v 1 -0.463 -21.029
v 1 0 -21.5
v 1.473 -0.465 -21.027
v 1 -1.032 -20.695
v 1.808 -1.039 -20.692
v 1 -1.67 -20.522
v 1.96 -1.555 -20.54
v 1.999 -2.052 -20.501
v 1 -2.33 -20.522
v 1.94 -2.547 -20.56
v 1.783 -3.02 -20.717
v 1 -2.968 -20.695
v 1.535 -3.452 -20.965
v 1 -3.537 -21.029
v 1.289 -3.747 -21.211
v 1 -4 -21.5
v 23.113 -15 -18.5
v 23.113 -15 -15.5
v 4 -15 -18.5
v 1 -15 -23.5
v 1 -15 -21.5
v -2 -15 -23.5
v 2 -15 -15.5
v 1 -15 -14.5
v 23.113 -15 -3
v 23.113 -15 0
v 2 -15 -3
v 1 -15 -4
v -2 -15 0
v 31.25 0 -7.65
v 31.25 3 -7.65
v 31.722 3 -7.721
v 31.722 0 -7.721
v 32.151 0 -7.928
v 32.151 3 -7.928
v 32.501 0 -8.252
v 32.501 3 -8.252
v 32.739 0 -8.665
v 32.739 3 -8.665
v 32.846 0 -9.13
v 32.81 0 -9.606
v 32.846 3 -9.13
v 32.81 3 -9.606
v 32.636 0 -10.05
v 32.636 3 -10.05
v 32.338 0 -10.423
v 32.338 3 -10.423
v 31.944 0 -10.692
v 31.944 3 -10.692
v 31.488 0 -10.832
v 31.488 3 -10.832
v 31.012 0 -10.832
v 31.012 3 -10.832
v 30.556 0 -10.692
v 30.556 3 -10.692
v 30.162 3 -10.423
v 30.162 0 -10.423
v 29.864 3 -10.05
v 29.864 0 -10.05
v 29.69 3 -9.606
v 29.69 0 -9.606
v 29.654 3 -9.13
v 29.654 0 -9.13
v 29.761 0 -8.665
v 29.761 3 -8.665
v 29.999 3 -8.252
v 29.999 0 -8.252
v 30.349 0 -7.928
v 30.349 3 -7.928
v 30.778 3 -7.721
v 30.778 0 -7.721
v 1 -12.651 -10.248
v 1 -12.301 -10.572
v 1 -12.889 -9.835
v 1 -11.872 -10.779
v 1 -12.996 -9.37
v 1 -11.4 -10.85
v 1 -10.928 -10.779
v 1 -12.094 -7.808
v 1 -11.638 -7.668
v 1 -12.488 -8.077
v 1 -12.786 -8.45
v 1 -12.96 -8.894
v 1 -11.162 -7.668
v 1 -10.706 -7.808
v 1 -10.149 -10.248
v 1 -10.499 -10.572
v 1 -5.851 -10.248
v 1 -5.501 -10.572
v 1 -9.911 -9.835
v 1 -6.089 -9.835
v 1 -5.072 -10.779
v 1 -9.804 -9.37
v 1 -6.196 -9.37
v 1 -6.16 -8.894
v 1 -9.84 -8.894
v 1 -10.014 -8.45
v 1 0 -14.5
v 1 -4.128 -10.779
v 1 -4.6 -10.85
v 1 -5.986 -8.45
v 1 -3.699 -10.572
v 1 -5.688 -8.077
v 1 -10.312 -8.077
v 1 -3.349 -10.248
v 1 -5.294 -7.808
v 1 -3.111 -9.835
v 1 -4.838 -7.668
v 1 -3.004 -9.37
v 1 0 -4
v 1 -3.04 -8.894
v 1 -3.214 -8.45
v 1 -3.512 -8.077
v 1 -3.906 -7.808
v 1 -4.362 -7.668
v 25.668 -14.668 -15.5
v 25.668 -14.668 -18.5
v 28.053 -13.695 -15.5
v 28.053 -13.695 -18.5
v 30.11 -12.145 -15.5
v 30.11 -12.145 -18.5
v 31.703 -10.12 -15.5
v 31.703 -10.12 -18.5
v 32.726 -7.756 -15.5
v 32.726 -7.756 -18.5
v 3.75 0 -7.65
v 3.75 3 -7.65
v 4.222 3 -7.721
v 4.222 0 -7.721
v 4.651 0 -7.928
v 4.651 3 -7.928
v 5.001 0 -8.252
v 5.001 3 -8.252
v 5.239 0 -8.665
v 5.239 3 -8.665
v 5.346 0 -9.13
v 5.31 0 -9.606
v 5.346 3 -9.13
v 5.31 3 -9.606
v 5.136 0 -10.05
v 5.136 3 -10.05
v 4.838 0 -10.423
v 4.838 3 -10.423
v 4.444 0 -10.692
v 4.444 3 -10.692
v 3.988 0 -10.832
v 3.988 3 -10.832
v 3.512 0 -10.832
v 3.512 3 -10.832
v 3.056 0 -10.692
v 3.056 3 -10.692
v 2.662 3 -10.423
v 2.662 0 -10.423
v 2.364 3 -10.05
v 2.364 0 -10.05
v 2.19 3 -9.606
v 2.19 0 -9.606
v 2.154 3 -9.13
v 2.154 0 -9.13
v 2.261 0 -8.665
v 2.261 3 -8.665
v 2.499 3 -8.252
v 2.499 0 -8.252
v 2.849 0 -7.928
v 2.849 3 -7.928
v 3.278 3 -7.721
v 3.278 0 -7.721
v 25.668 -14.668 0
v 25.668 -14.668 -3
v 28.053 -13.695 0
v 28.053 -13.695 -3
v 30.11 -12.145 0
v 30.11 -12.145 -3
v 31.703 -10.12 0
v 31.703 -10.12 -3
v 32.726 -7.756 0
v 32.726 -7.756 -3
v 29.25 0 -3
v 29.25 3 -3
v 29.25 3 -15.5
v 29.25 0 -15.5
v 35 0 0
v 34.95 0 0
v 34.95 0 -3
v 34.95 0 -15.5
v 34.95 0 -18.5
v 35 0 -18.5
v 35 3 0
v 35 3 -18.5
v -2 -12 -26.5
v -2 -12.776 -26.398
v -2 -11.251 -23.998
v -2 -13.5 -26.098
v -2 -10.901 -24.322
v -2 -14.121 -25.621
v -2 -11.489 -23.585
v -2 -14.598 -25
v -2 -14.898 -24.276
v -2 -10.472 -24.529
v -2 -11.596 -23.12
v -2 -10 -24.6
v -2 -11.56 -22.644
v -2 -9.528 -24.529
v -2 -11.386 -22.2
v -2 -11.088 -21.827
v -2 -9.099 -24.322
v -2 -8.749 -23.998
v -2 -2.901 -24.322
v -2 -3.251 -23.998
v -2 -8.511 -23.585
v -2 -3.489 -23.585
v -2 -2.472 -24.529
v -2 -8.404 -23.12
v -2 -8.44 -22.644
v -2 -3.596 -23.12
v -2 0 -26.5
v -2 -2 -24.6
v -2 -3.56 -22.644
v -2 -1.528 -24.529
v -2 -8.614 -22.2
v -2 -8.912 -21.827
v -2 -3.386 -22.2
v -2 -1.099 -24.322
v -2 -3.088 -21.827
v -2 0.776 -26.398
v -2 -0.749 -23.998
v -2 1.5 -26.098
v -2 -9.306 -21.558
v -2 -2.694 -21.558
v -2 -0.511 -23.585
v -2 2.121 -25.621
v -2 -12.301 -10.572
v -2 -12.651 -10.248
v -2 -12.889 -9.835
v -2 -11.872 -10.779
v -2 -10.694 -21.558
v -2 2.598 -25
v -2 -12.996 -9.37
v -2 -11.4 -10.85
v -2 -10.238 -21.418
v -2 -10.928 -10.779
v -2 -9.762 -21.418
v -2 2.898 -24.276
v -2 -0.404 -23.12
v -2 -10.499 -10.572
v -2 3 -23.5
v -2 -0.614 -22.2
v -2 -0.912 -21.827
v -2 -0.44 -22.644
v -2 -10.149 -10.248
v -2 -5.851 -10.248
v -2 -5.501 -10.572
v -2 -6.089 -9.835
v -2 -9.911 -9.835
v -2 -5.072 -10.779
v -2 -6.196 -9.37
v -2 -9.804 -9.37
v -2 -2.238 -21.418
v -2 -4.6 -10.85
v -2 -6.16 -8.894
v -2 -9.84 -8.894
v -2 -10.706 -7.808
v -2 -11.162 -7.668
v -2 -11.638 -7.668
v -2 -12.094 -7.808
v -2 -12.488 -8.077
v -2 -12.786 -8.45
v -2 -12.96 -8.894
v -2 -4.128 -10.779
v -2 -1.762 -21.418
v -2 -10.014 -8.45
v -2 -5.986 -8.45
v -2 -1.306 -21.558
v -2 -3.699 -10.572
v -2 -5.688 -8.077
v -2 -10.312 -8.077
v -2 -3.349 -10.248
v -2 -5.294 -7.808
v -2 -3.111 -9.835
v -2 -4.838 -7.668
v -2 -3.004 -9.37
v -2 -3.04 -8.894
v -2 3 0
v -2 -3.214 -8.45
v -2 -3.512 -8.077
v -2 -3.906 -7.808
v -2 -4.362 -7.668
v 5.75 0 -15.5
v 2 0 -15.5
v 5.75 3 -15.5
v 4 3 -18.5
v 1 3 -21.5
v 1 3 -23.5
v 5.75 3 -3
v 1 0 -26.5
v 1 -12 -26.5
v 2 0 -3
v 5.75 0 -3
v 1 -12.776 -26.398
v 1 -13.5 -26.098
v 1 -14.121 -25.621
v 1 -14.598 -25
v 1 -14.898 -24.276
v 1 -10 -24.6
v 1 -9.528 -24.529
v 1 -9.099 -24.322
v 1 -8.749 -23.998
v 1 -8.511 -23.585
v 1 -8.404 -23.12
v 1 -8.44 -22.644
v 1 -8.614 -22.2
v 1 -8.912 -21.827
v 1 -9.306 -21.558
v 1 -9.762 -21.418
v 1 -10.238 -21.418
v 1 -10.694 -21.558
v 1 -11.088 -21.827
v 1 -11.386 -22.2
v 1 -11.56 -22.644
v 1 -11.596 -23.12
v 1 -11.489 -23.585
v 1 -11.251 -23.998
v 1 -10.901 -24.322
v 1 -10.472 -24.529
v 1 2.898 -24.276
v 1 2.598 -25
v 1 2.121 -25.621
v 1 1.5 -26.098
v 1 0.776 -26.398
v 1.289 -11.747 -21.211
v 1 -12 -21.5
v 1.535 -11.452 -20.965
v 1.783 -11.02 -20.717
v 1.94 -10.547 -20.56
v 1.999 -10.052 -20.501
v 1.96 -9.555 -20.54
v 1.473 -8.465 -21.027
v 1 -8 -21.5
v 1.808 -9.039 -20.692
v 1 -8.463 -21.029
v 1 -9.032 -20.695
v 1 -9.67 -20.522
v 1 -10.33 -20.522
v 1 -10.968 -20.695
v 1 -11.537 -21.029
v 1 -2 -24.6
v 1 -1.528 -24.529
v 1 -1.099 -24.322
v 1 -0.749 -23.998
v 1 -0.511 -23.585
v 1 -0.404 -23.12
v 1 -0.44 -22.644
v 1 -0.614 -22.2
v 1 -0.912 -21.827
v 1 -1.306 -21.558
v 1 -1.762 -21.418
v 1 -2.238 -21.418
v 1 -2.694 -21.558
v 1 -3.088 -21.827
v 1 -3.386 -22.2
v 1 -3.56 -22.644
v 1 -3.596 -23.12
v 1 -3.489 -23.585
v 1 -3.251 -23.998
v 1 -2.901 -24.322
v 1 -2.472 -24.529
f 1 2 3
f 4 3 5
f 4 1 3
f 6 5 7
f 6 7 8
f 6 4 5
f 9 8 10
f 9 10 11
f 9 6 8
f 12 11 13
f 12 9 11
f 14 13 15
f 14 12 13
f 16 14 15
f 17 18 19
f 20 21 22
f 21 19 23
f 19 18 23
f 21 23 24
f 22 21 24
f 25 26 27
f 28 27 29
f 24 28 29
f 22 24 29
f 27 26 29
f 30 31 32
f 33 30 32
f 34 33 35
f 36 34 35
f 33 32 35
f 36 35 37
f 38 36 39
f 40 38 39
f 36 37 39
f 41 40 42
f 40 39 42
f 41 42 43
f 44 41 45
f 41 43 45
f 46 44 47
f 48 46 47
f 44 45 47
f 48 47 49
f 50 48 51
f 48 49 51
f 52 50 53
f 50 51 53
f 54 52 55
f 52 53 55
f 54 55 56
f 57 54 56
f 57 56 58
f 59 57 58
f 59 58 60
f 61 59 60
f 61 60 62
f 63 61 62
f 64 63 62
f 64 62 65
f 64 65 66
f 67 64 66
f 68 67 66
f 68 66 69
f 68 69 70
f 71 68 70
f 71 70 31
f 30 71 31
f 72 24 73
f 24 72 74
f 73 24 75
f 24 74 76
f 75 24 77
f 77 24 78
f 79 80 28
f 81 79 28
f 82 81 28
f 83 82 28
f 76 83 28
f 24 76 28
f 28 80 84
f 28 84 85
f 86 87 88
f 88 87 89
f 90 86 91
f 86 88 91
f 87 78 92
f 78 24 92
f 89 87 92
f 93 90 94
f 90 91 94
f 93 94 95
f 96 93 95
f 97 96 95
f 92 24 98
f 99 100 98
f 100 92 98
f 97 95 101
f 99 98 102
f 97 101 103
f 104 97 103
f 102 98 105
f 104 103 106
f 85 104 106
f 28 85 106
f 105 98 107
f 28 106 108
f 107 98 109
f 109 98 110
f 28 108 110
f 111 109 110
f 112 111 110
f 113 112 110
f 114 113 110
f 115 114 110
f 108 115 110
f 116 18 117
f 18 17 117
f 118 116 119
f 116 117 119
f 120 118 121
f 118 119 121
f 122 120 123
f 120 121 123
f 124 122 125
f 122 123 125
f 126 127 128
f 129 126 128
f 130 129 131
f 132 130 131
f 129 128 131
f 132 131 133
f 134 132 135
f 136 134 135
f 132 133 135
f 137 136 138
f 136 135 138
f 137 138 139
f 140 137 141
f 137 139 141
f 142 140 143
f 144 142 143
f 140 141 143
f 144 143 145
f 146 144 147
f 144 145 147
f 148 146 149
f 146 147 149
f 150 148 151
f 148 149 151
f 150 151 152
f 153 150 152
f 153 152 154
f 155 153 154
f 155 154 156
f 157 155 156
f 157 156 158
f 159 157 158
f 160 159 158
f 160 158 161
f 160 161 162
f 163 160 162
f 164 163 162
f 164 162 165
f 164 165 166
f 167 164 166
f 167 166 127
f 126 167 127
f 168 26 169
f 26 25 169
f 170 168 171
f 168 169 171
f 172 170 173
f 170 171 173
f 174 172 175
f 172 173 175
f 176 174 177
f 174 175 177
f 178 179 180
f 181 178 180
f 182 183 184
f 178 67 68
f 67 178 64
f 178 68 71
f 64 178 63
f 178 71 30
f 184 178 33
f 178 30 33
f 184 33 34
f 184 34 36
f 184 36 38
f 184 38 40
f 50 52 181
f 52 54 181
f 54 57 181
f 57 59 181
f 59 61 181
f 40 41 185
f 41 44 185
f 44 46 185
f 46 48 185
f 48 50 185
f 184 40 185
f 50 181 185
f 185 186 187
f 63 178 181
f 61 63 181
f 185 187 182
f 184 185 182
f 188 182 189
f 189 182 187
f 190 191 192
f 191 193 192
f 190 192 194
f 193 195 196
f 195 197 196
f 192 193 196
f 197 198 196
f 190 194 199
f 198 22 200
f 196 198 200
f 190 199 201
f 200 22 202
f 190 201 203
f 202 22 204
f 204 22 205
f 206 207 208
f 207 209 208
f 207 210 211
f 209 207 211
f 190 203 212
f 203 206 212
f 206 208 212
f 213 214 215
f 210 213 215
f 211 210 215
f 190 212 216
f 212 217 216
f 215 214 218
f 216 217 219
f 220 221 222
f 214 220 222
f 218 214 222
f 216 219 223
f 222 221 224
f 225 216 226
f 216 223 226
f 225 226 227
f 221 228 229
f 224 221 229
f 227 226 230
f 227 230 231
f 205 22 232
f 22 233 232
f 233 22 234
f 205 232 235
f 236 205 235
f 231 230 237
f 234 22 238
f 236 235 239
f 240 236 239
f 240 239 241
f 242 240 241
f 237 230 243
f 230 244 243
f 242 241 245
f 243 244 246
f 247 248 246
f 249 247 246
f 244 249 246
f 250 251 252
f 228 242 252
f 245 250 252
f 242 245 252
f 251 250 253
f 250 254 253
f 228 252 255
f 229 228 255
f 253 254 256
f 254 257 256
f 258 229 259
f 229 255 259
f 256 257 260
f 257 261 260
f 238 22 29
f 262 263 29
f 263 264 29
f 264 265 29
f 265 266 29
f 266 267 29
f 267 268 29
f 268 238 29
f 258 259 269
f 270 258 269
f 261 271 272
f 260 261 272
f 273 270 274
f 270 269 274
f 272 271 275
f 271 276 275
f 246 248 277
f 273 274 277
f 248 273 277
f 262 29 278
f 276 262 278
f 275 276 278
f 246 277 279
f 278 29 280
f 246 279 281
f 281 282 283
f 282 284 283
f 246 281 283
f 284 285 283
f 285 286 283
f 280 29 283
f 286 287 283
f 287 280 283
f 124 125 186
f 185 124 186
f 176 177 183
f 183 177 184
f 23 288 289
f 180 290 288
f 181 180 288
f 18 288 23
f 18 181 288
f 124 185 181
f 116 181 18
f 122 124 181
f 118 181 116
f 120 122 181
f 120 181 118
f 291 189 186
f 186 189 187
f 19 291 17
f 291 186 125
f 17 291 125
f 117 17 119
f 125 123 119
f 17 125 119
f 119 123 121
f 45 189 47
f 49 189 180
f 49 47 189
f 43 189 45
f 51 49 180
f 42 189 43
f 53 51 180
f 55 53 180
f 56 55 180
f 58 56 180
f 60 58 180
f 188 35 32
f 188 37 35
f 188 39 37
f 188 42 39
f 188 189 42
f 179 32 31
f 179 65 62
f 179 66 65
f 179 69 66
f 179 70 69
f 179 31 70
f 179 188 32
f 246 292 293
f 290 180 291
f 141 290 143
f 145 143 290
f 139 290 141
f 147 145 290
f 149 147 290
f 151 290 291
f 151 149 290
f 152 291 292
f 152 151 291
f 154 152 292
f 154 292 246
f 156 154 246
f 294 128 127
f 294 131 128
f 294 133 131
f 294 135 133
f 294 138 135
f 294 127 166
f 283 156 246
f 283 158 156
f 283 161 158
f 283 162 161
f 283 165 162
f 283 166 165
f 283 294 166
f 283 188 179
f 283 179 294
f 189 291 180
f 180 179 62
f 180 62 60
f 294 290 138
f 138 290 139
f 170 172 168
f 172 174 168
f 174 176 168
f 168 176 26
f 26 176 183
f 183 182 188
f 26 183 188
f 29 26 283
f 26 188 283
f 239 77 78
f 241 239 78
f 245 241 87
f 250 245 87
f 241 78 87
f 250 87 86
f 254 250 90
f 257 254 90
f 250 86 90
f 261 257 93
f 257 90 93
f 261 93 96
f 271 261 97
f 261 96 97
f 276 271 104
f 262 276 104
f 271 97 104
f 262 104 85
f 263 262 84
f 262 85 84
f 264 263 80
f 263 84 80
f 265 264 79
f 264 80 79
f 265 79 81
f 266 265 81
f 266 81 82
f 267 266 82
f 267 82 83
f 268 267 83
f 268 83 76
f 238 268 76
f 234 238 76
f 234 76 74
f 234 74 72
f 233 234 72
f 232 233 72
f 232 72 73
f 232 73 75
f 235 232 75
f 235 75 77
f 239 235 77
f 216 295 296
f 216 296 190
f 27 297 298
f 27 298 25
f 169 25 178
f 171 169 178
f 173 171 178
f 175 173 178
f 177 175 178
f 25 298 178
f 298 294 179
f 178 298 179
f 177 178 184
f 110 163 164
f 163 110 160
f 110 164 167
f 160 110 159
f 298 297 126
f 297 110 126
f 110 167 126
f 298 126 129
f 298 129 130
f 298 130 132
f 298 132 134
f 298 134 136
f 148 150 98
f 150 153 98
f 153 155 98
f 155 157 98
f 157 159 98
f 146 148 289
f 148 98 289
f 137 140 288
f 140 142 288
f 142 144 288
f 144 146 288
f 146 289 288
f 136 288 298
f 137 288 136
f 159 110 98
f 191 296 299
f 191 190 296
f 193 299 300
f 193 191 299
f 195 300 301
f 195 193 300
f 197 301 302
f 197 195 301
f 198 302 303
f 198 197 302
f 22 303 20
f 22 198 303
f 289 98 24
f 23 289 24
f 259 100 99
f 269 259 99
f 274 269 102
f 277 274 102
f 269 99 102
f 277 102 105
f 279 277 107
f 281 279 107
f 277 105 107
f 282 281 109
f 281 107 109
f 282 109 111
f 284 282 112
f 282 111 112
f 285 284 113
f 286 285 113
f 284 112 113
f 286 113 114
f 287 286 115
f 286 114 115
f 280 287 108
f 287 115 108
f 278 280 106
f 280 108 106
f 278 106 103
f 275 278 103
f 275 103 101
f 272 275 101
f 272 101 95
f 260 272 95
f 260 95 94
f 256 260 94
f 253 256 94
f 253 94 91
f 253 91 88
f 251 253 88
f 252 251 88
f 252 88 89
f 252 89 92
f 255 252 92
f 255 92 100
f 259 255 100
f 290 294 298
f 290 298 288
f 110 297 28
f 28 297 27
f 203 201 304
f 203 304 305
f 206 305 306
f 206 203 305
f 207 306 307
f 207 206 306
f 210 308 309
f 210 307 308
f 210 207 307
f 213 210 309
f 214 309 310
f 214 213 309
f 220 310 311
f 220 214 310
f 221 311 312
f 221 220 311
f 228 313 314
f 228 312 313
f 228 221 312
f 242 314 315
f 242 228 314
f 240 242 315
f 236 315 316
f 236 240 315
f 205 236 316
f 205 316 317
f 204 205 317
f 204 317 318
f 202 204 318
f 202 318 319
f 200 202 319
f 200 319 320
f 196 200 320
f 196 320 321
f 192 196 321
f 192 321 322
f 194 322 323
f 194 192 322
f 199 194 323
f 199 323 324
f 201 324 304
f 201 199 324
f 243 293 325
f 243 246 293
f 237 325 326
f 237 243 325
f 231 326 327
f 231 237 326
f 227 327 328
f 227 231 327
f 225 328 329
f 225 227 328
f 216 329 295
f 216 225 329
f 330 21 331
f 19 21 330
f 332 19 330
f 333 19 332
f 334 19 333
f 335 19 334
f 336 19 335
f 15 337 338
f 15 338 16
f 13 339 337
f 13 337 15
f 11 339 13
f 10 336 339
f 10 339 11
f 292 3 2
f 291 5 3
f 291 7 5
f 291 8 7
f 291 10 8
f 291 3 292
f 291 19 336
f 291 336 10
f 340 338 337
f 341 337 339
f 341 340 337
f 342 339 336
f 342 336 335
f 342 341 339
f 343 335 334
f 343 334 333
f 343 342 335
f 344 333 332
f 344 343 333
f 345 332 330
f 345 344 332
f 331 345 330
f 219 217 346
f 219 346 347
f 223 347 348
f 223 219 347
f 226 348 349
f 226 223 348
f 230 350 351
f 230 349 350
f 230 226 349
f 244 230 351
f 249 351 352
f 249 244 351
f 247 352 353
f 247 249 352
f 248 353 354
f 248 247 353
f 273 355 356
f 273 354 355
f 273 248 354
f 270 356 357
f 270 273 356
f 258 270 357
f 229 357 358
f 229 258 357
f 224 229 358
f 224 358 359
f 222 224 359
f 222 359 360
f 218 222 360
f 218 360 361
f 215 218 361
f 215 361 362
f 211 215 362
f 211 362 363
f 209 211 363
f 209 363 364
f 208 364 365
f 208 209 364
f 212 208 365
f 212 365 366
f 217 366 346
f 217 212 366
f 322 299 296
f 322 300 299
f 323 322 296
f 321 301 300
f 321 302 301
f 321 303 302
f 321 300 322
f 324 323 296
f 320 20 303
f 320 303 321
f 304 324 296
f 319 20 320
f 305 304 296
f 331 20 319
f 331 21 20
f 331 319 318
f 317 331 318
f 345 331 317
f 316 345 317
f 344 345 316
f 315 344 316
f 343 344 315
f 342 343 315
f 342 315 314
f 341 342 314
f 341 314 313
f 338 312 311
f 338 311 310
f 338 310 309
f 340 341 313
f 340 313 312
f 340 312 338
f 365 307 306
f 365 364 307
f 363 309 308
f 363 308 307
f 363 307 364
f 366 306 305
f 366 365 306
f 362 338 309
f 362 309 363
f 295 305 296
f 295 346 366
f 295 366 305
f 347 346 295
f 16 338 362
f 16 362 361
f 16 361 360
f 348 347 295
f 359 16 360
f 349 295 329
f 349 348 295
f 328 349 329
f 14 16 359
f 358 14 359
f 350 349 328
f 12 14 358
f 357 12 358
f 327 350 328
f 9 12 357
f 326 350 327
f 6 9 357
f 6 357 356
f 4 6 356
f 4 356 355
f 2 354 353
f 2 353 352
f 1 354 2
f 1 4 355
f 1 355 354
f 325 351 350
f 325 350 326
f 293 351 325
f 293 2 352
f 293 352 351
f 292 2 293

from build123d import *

# Parameters (mm, degrees)
SKETCH_1_W               = 35
SKETCH_1_H               = 18.5
EXTRUDE_1_DEPTH          = 3
SKETCH_2_R               = 1.6
SKETCH_2_W               = 23.5
SKETCH_2_H               = 12.5
CUT_EXTRUDE_1_DEPTH      = 40.702015062
SKETCH_3_W               = 2
SKETCH_3_H               = 18.5
EXTRUDE_2_DEPTH          = 3
EXTRUDE_3_DEPTH          = 15
CHAMFER_1_SIZE           = 19.87826233
CHAMFER_1_SIZE_2         = 5.7
SKETCH_6_R               = 1.6
CUT_EXTRUDE_2_DEPTH      = 42.512046444
SKETCH_8_W               = 3
SKETCH_8_H               = 18
EXTRUDE_4_DEPTH          = 8
CHAMFER_2_SIZE           = 3
CUT_EXTRUDE_3_DEPTH      = 46.642633579
CUT_EXTRUDE_3_DEPTH_BACK = 46.642633579
SKETCH_10_R              = 1.6
SKETCH_11_R              = 2.5
CUT_EXTRUDE_4_DEPTH      = 46.642633579
FILLET_1_R               = 3
FILLET_2_R               = 10
CHAMFER_3_SIZE           = 1


with BuildPart() as part:
    # 草图1 → 凸台-拉伸1 (new body)
    with BuildSketch(Plane(origin=(0, 0, 0), x_dir=(1, 0, 0), z_dir=(0, 1, 0))):
        with Locations((17.5, 9.25)):
            Rectangle(SKETCH_1_W, SKETCH_1_H)
    extrude(amount=EXTRUDE_1_DEPTH)

    # 草图2 → 切除-拉伸1 (cut, through all)
    with BuildSketch(Plane(origin=(0, 3, 0), x_dir=(1, 0, 0), z_dir=(0, 1, 0))):
        with Locations(Location((3.75, 9.25, 0), (0, 0, 270))):
            Circle(SKETCH_2_R)
        with Locations(Location((31.25, 9.25, 0), (0, 0, 270))):
            Circle(SKETCH_2_R)
        with Locations((17.5, 9.25)):
            Rectangle(SKETCH_2_W, SKETCH_2_H)
    extrude(amount=-CUT_EXTRUDE_1_DEPTH, mode=Mode.SUBTRACT)

    # 草图3 → 凸台-拉伸2 (add)
    with BuildSketch(Plane(origin=(0, 3, 0), x_dir=(1, 0, 0), z_dir=(0, 1, 0))):
        with Locations((-1, 9.25)):
            Rectangle(SKETCH_3_W, SKETCH_3_H)
    extrude(amount=-EXTRUDE_2_DEPTH)

    # 草图5 → 凸台-拉伸3 (add)
    with BuildSketch(Plane(origin=(0, 0, 0), x_dir=(-1, 0, 0), z_dir=(0, -1, 0))):
        Polygon((-29.25, 15.5), (-1, 15.5), (-1, 3), (-29.25, 3), (-29.25, 0), (2, 0), (2, 3.75), (2, 16.25), (2, 18.5), (-29.25, 18.5), align=None)
    extrude(amount=EXTRUDE_3_DEPTH)

    # 倒角1
    # the kernel refuses this chamfer: 19.87826233, 5.7 mm, written as the material it adds along each edge
    with BuildSketch(Plane(origin=(29.25, 0, -18.5), x_dir=(-0.010616657410321141, -0.9999436417045873, 0), z_dir=(0, 0, 1))) as chamfer_1_piece_1_section:
        Polygon((CHAMFER_1_SIZE * 0.999943641699, CHAMFER_1_SIZE * 0.0106166574103), (-CHAMFER_1_SIZE_2 * 0.0106166574103, CHAMFER_1_SIZE_2 * 0.999943641705), (0, 0), align=None)
    chamfer_1_piece_1 = extrude(amount=3, mode=Mode.PRIVATE)
    chamfer_1_piece_1 = split(chamfer_1_piece_1, bisect_by=Plane(origin=(31.241878904, -15, -17), z_dir=(0, 1, 0)), keep=Keep.TOP, mode=Mode.PRIVATE)
    add(chamfer_1_piece_1)
    with BuildSketch(Plane(origin=(29.25, 0, -70.109385658), x_dir=(-0.010616657410321141, -0.9999436417045873, 0), z_dir=(0, 0, 1))) as chamfer_1_piece_2_section:
        Polygon((CHAMFER_1_SIZE * 0.999943641699, CHAMFER_1_SIZE * 0.0106166574103), (-CHAMFER_1_SIZE_2 * 0.0106166574103, CHAMFER_1_SIZE_2 * 0.999943641705), (0, 0), align=None)
    chamfer_1_piece_2 = extrude(amount=106.218771315, mode=Mode.PRIVATE)
    chamfer_1_piece_2 = split(chamfer_1_piece_2, bisect_by=Plane(origin=(31.241878904, -5.985247808, 0), z_dir=(0, 0, -1)), keep=Keep.TOP, mode=Mode.PRIVATE)
    chamfer_1_piece_2 = split(chamfer_1_piece_2, bisect_by=Plane(origin=(31.241878904, -5.985247808, -3), z_dir=(0, 0, 1)), keep=Keep.TOP, mode=Mode.PRIVATE)
    chamfer_1_piece_2 = split(chamfer_1_piece_2, bisect_by=Plane(origin=(31.241878904, -15, -1.5), z_dir=(0, 1, 0)), keep=Keep.TOP, mode=Mode.PRIVATE)
    add(chamfer_1_piece_2)
    with BuildSketch(Plane(origin=(29.25, 0, -54.609385658), x_dir=(-0.010616657410321141, -0.9999436417045873, 0), z_dir=(0, 0, 1))) as chamfer_1_piece_3_section:
        Polygon((CHAMFER_1_SIZE * 0.999943641699, CHAMFER_1_SIZE * 0.0106166574103), (-CHAMFER_1_SIZE_2 * 0.0106166574103, CHAMFER_1_SIZE_2 * 0.999943641705), (0, 0), align=None)
    chamfer_1_piece_3 = extrude(amount=106.218771315, mode=Mode.PRIVATE)
    chamfer_1_piece_3 = split(chamfer_1_piece_3, bisect_by=Plane(origin=(31.241878904, -5.985247808, -15.5), z_dir=(0, 0, -1)), keep=Keep.TOP, mode=Mode.PRIVATE)
    chamfer_1_piece_3 = split(chamfer_1_piece_3, bisect_by=Plane(origin=(31.241878904, -5.985247808, -18.5), z_dir=(0, 0, 1)), keep=Keep.TOP, mode=Mode.PRIVATE)
    chamfer_1_piece_3 = split(chamfer_1_piece_3, bisect_by=Plane(origin=(31.241878904, -15, -17), z_dir=(0, 1, 0)), keep=Keep.TOP, mode=Mode.PRIVATE)
    add(chamfer_1_piece_3)
    with BuildSketch(Plane(origin=(29.25, 0, -3), x_dir=(-0.010616657410321141, -0.9999436417045873, 0), z_dir=(0, 0, 1))) as chamfer_1_piece_4_section:
        Polygon((CHAMFER_1_SIZE * 0.999943641699, CHAMFER_1_SIZE * 0.0106166574103), (-CHAMFER_1_SIZE_2 * 0.0106166574103, CHAMFER_1_SIZE_2 * 0.999943641705), (0, 0), align=None)
    chamfer_1_piece_4 = extrude(amount=3, mode=Mode.PRIVATE)
    chamfer_1_piece_4 = split(chamfer_1_piece_4, bisect_by=Plane(origin=(31.241878904, -15, -1.5), z_dir=(0, 1, 0)), keep=Keep.TOP, mode=Mode.PRIVATE)
    add(chamfer_1_piece_4)

    # 草图6 → 切除-拉伸2 (cut, through all)
    with BuildSketch(Plane(origin=(1, 0, 0), x_dir=(0, 0, -1), z_dir=(1, 0, 0))):
        with Locations((9.25, -4.6)):
            Circle(SKETCH_6_R)
        with Locations((9.25, -11.4)):
            Circle(SKETCH_6_R)
    extrude(amount=-CUT_EXTRUDE_2_DEPTH, mode=Mode.SUBTRACT)

    # 草图8 → 凸台-拉伸4 (add)
    with BuildSketch(Plane(origin=(0, 0, -18.5), x_dir=(-1, 0, 0), z_dir=(0, 0, -1))):
        with Locations((0.5, -6)):
            Rectangle(SKETCH_8_W, SKETCH_8_H)
    extrude(amount=EXTRUDE_4_DEPTH)

    # 倒角2
    chamfer_2_edges = [part.edges().sort_by_distance(p)[0] for p in [
        (1, -6, -18.5),
    ]]
    chamfer(chamfer_2_edges, length=CHAMFER_2_SIZE)

    # 草图10 → 切除-拉伸3 (cut, two sides: drawn at the far end of the back side and taken through both)
    with BuildSketch(Plane(origin=(1, 0, 0), x_dir=(0, 0, -1), z_dir=(1, 0, 0)).offset(-CUT_EXTRUDE_3_DEPTH_BACK)):
        with Locations((23, -2)):
            Circle(SKETCH_10_R)
        with Locations((23, -10)):
            Circle(SKETCH_10_R)
    extrude(amount=CUT_EXTRUDE_3_DEPTH + CUT_EXTRUDE_3_DEPTH_BACK, mode=Mode.SUBTRACT)

    # 草图11 → 切除-拉伸4 (cut, through all)
    with BuildSketch(Plane(origin=(1, 0, 0), x_dir=(0, 0, -1), z_dir=(1, 0, 0))):
        with Locations((23, -2)):
            Circle(SKETCH_11_R)
        with Locations((23, -10)):
            Circle(SKETCH_11_R)
    extrude(amount=CUT_EXTRUDE_4_DEPTH, mode=Mode.SUBTRACT)

    # 圆角1
    fillet_1_edges = [part.edges().sort_by_distance(p)[0] for p in [
        (-0.5, 3, -26.5),
        (-0.5, -15, -26.5),
    ]]
    fillet(fillet_1_edges, radius=FILLET_1_R)

    # 圆角2
    fillet_2_edges = [part.edges().sort_by_distance(p)[0] for p in [
        (30.648819214, -15, -17),
        (30.648819214, -15, -1.5),
    ]]
    fillet(fillet_2_edges, radius=FILLET_2_R)

    # 倒角3
    chamfer_3_edges = [part.edges().sort_by_distance(p)[0] for p in [
        (1, -7.5, -15.5),
        (1, -7.5, -3),
    ]]
    chamfer(chamfer_3_edges, length=CHAMFER_3_SIZE)


solid = part.part
